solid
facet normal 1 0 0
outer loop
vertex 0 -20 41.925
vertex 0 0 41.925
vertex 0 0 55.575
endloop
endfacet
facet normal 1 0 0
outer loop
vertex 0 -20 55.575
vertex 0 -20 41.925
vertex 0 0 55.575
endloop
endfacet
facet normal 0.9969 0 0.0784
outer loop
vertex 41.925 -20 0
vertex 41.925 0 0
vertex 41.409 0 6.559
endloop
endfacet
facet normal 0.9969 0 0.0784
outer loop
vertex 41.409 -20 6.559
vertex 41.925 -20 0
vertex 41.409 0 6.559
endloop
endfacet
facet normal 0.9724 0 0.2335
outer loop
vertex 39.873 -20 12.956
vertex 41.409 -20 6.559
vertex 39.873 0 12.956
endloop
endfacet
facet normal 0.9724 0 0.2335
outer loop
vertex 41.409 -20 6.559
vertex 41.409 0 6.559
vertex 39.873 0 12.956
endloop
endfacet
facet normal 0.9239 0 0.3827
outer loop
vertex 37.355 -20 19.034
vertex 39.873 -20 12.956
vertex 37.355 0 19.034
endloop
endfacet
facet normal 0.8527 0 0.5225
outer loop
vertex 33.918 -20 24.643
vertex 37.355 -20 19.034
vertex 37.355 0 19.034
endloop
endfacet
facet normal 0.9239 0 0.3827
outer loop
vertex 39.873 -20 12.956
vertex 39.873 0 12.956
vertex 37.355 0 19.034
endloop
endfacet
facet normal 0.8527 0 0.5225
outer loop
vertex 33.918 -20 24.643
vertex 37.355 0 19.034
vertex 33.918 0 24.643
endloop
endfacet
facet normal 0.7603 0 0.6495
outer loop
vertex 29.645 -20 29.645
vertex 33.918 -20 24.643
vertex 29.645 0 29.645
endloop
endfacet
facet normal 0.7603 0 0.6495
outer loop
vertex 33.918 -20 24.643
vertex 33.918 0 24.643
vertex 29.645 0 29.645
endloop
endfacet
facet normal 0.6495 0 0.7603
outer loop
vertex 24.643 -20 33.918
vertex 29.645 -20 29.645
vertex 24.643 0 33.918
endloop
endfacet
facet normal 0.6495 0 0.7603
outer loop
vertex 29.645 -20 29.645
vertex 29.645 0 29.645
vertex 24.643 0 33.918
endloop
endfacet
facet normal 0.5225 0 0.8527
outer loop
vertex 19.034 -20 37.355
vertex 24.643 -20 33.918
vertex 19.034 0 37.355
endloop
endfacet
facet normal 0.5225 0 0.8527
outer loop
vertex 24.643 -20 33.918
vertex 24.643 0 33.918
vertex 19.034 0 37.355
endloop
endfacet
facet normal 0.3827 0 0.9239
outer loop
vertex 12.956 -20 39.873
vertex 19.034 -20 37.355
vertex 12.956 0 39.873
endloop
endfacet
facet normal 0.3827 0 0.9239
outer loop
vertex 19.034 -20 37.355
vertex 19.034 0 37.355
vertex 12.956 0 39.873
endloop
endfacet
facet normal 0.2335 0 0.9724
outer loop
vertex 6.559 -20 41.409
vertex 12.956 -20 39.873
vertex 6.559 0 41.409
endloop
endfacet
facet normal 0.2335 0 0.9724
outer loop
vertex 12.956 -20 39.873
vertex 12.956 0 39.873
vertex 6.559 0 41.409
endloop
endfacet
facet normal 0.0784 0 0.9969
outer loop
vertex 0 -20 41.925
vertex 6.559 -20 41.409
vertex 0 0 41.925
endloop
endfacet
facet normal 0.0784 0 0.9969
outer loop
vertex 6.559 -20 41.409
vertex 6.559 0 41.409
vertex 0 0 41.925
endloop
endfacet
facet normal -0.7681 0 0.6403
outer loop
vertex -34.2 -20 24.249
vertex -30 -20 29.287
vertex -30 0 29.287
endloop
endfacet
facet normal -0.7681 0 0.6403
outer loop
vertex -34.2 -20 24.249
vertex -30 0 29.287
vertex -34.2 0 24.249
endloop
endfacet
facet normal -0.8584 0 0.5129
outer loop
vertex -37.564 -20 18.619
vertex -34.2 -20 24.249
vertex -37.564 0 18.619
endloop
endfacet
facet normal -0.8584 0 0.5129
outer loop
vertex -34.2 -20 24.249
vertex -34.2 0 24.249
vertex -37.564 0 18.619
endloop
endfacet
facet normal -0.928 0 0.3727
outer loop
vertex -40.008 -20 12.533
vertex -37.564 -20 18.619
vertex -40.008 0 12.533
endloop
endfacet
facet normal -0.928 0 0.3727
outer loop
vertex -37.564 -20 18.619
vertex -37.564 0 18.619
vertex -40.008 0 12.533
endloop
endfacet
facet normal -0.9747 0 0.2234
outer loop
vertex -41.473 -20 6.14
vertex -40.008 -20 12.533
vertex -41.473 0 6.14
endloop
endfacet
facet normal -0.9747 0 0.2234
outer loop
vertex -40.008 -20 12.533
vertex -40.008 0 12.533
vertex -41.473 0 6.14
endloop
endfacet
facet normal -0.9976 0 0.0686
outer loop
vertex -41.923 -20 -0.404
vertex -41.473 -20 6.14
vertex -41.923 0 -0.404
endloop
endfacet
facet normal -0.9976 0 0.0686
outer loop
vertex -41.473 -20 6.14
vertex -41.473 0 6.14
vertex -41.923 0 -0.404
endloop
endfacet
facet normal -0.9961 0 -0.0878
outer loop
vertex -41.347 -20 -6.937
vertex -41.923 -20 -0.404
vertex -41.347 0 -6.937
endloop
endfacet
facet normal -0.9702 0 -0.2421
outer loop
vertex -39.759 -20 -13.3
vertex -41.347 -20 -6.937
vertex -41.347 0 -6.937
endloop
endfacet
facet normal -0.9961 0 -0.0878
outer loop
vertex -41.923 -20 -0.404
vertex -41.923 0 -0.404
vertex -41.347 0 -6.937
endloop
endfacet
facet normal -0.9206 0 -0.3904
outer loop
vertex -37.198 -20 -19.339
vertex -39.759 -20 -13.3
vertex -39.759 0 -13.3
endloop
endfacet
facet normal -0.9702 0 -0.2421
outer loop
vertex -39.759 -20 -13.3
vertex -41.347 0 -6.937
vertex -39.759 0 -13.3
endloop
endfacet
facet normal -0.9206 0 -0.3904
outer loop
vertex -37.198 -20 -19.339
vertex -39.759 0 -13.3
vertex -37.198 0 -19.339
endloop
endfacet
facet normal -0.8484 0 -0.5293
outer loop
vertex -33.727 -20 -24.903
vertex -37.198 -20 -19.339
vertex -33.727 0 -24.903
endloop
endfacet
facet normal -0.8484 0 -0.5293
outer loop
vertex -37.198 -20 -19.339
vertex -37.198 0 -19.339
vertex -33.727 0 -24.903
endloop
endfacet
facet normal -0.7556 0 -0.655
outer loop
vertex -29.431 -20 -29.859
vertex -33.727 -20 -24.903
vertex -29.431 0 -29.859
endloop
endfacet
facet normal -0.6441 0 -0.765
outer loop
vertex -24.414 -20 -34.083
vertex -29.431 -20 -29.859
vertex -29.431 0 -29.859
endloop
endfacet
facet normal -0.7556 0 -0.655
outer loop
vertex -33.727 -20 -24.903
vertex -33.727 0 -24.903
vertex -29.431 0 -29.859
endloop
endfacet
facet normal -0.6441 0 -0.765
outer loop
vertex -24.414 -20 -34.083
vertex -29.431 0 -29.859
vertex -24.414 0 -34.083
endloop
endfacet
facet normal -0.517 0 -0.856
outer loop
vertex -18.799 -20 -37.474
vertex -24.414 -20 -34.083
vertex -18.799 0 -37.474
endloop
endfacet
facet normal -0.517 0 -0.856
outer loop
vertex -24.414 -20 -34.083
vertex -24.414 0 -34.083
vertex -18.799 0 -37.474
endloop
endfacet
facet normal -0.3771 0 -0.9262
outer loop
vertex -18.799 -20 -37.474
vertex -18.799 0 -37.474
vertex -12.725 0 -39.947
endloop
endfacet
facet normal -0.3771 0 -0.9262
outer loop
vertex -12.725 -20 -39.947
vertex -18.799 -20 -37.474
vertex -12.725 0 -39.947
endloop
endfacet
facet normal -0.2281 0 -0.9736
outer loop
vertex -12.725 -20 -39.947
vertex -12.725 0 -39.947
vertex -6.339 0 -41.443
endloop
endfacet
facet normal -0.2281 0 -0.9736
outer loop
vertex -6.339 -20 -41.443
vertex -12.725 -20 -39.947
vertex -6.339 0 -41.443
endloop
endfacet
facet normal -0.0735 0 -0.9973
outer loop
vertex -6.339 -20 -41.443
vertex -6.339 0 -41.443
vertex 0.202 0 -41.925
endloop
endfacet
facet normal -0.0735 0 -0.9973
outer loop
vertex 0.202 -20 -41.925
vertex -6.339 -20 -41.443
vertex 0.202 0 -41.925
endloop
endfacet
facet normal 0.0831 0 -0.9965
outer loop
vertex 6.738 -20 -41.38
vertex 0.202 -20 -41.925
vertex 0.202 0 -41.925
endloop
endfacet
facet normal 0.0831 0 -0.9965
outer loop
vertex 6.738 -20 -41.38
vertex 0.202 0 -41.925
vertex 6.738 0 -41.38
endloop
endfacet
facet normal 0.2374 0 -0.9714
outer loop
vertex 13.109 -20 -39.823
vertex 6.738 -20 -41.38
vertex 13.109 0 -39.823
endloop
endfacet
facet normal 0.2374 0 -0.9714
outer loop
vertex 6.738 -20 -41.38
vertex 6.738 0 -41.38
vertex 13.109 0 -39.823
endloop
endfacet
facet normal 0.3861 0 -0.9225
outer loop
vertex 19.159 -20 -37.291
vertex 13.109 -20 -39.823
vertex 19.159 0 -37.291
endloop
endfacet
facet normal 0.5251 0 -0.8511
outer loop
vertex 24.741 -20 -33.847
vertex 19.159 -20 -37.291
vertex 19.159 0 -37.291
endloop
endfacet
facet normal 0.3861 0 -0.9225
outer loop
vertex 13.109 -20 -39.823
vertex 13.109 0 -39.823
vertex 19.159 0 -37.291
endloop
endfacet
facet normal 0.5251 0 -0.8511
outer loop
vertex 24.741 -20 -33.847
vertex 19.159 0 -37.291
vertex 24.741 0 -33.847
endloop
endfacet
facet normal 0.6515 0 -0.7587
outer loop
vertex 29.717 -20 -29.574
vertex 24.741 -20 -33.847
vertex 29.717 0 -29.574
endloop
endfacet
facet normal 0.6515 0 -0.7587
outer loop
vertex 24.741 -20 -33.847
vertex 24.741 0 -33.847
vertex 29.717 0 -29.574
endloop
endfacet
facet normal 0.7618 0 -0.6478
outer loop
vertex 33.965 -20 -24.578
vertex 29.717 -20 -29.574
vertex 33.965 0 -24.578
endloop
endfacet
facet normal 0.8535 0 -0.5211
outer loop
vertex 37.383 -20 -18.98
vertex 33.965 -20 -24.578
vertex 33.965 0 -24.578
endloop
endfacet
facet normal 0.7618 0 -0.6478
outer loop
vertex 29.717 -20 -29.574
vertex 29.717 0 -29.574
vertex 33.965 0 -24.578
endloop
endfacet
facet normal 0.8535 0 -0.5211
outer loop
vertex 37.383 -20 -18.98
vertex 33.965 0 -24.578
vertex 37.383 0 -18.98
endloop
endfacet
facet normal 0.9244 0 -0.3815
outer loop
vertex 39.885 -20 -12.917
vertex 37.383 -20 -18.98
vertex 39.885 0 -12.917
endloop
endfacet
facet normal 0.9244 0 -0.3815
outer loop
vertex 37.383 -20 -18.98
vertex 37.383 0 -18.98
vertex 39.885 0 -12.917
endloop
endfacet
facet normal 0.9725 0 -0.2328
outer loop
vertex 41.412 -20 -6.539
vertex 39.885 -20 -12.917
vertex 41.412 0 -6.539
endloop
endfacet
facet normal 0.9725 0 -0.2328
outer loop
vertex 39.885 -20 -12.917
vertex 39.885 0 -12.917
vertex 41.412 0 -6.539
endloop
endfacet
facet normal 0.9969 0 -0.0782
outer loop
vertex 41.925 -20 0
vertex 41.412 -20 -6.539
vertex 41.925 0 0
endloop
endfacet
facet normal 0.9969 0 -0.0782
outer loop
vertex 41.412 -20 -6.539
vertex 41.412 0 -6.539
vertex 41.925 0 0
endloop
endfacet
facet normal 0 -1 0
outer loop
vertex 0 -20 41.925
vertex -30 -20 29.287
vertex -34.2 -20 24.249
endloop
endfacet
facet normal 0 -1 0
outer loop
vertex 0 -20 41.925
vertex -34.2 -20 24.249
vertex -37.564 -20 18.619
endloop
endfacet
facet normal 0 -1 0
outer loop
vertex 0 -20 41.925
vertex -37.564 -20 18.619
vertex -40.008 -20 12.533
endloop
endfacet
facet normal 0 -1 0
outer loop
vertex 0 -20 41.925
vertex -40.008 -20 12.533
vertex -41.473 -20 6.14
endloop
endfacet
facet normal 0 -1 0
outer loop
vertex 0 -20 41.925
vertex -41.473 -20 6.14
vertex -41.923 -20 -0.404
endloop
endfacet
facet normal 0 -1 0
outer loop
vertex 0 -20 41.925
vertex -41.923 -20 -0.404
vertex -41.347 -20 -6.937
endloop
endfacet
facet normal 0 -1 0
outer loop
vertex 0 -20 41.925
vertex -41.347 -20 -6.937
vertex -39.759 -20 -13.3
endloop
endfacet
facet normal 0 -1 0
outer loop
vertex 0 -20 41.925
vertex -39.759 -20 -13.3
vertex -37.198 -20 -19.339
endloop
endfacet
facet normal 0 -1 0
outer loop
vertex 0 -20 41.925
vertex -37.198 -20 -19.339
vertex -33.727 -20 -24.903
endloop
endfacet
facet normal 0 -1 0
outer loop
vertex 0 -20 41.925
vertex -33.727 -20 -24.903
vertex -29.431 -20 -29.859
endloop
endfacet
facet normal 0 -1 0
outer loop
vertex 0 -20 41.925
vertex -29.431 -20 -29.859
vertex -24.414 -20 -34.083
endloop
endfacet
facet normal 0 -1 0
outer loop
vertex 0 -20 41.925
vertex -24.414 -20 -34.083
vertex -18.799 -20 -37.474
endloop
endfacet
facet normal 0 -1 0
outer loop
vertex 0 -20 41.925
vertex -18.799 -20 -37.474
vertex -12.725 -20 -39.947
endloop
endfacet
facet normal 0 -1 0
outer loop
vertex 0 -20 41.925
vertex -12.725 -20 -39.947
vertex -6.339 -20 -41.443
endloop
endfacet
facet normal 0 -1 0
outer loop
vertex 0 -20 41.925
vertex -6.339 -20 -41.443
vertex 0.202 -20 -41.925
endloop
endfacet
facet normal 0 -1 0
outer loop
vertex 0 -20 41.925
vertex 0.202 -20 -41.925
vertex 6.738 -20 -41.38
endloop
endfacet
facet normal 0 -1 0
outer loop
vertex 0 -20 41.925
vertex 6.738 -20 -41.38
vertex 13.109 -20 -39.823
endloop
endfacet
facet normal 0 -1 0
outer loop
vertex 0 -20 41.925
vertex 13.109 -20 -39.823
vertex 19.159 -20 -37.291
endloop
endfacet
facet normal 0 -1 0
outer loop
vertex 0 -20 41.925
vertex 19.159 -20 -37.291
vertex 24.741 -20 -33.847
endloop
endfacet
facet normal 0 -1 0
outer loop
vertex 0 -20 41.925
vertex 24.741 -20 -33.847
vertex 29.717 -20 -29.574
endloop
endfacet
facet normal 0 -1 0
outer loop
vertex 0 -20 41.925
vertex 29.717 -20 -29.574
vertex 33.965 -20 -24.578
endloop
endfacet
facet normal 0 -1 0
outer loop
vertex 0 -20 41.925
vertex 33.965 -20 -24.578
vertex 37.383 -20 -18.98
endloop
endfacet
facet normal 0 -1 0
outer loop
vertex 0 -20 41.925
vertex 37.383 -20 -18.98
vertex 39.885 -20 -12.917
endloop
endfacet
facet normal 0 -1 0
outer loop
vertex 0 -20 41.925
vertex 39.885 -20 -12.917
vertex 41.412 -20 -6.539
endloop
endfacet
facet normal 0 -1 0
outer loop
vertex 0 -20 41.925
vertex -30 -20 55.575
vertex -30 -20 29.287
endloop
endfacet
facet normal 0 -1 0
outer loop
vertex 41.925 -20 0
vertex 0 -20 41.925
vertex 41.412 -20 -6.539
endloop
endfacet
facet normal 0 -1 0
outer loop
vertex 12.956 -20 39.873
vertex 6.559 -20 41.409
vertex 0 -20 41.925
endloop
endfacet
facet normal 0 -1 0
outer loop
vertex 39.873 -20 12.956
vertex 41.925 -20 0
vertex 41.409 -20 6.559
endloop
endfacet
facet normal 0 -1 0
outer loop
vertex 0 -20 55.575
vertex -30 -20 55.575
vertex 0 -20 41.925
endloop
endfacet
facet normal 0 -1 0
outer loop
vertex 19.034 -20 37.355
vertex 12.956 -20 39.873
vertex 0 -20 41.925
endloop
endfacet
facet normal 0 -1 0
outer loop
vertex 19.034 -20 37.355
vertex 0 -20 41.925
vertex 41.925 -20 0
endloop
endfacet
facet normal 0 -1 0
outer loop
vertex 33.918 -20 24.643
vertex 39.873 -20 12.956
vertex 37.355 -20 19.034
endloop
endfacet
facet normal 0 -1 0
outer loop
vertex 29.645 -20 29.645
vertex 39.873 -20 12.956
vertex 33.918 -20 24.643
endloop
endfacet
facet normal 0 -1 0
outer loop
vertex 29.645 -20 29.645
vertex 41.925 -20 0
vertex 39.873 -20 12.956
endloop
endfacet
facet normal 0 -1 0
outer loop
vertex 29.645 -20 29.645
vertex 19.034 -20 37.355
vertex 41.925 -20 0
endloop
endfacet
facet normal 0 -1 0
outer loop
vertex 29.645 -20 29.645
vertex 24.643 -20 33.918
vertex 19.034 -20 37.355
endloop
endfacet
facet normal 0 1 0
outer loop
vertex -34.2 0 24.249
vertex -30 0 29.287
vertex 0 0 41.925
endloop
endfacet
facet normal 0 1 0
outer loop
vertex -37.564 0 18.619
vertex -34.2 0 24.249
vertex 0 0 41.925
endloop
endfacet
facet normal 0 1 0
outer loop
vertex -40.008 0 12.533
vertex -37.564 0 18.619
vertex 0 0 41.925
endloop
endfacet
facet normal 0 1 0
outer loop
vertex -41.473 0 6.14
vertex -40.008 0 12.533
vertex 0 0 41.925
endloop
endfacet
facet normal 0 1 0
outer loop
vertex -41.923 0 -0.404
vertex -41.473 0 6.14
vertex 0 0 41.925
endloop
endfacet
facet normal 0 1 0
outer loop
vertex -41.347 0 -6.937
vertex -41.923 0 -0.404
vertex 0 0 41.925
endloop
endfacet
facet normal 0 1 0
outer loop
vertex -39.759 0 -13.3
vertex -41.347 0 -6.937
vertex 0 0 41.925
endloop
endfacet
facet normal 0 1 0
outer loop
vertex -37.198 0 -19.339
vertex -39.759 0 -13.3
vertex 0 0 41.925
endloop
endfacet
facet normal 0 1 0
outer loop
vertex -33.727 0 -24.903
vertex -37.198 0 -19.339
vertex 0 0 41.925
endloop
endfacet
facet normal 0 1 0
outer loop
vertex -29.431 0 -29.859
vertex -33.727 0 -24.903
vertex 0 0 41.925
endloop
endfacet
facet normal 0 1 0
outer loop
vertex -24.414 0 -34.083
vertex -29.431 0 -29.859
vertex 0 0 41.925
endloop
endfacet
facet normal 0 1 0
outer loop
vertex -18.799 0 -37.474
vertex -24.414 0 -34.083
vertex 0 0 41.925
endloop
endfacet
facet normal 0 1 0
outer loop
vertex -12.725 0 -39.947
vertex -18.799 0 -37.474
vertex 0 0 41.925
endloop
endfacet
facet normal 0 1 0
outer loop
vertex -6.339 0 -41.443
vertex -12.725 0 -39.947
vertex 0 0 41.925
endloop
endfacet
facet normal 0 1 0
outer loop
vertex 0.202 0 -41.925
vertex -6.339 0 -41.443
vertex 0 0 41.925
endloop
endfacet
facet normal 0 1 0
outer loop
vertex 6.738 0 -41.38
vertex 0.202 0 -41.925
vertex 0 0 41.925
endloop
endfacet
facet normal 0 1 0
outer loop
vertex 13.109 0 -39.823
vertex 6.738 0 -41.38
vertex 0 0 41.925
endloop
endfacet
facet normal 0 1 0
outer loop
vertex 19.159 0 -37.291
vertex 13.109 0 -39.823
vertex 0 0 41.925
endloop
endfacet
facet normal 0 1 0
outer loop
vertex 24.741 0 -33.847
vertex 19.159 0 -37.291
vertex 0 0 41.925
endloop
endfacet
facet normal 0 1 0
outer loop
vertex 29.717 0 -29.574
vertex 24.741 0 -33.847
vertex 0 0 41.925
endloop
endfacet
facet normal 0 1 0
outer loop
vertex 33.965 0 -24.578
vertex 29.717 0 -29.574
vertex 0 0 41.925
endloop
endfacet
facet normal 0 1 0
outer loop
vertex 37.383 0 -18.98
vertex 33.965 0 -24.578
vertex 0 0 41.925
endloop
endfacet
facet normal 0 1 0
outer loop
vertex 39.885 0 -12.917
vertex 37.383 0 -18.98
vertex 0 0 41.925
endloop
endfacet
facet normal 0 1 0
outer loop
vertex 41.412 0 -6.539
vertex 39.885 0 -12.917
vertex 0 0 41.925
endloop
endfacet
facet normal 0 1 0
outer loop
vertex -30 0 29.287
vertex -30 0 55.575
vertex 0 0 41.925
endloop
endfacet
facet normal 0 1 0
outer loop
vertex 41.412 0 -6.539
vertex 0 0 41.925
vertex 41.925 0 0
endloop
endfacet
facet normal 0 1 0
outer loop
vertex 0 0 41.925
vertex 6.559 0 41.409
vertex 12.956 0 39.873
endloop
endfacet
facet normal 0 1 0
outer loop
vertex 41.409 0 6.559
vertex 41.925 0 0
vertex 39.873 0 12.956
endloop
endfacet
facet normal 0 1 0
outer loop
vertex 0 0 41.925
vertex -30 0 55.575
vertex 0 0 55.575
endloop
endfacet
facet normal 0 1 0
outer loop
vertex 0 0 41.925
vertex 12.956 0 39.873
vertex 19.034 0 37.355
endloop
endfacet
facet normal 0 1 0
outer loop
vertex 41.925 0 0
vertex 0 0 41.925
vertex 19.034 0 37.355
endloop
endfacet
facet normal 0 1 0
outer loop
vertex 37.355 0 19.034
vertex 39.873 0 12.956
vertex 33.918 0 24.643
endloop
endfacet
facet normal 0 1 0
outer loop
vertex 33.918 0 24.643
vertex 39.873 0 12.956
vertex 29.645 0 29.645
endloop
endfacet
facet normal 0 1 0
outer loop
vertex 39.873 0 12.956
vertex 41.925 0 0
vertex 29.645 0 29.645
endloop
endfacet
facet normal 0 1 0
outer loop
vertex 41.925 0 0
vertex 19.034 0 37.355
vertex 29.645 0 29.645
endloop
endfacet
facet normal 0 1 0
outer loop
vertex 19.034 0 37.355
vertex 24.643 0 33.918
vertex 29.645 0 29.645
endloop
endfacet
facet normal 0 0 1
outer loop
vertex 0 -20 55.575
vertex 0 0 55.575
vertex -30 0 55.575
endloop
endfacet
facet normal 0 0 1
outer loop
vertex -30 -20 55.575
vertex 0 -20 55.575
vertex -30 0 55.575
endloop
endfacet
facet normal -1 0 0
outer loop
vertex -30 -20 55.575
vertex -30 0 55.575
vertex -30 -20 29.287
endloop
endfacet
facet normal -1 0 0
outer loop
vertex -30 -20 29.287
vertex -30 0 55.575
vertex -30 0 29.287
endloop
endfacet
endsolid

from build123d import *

# Parameters (mm, degrees)
F1_DEPTH = 20


with BuildPart() as f1:
    # F0 (on Front) → F1 (new body)
    with BuildSketch(Plane.XZ):
        with BuildLine():
            ThreePointArc((-30, 29.286612), (-15.810687, -38.829471), (41.925, 0))
            ThreePointArc((41.925, 0), (29.645452, 29.645452), (0, 41.925))
            Line((0, 41.925), (0, 0))
            Line((0, 0), (-30, 0))
            Line((-30, 0), (-30, 29.286612))
        make_face()
        with BuildLine():
            Line((0, 0), (0, 41.925))
            ThreePointArc((0, 41.925), (-16.276738, 38.636426), (-30, 29.286612))
            Line((-30, 29.286612), (-30, 0))
            Line((-30, 0), (0, 0))
        make_face()
        with BuildLine():
            ThreePointArc((-30, 29.286612), (-16.276738, 38.636426), (0, 41.925))
            Line((0, 41.925), (0, 55.575))
            Line((0, 55.575), (-30, 55.575))
            Line((-30, 55.575), (-30, 29.286612))
        make_face()
    extrude(amount=F1_DEPTH)


solid = f1.part
